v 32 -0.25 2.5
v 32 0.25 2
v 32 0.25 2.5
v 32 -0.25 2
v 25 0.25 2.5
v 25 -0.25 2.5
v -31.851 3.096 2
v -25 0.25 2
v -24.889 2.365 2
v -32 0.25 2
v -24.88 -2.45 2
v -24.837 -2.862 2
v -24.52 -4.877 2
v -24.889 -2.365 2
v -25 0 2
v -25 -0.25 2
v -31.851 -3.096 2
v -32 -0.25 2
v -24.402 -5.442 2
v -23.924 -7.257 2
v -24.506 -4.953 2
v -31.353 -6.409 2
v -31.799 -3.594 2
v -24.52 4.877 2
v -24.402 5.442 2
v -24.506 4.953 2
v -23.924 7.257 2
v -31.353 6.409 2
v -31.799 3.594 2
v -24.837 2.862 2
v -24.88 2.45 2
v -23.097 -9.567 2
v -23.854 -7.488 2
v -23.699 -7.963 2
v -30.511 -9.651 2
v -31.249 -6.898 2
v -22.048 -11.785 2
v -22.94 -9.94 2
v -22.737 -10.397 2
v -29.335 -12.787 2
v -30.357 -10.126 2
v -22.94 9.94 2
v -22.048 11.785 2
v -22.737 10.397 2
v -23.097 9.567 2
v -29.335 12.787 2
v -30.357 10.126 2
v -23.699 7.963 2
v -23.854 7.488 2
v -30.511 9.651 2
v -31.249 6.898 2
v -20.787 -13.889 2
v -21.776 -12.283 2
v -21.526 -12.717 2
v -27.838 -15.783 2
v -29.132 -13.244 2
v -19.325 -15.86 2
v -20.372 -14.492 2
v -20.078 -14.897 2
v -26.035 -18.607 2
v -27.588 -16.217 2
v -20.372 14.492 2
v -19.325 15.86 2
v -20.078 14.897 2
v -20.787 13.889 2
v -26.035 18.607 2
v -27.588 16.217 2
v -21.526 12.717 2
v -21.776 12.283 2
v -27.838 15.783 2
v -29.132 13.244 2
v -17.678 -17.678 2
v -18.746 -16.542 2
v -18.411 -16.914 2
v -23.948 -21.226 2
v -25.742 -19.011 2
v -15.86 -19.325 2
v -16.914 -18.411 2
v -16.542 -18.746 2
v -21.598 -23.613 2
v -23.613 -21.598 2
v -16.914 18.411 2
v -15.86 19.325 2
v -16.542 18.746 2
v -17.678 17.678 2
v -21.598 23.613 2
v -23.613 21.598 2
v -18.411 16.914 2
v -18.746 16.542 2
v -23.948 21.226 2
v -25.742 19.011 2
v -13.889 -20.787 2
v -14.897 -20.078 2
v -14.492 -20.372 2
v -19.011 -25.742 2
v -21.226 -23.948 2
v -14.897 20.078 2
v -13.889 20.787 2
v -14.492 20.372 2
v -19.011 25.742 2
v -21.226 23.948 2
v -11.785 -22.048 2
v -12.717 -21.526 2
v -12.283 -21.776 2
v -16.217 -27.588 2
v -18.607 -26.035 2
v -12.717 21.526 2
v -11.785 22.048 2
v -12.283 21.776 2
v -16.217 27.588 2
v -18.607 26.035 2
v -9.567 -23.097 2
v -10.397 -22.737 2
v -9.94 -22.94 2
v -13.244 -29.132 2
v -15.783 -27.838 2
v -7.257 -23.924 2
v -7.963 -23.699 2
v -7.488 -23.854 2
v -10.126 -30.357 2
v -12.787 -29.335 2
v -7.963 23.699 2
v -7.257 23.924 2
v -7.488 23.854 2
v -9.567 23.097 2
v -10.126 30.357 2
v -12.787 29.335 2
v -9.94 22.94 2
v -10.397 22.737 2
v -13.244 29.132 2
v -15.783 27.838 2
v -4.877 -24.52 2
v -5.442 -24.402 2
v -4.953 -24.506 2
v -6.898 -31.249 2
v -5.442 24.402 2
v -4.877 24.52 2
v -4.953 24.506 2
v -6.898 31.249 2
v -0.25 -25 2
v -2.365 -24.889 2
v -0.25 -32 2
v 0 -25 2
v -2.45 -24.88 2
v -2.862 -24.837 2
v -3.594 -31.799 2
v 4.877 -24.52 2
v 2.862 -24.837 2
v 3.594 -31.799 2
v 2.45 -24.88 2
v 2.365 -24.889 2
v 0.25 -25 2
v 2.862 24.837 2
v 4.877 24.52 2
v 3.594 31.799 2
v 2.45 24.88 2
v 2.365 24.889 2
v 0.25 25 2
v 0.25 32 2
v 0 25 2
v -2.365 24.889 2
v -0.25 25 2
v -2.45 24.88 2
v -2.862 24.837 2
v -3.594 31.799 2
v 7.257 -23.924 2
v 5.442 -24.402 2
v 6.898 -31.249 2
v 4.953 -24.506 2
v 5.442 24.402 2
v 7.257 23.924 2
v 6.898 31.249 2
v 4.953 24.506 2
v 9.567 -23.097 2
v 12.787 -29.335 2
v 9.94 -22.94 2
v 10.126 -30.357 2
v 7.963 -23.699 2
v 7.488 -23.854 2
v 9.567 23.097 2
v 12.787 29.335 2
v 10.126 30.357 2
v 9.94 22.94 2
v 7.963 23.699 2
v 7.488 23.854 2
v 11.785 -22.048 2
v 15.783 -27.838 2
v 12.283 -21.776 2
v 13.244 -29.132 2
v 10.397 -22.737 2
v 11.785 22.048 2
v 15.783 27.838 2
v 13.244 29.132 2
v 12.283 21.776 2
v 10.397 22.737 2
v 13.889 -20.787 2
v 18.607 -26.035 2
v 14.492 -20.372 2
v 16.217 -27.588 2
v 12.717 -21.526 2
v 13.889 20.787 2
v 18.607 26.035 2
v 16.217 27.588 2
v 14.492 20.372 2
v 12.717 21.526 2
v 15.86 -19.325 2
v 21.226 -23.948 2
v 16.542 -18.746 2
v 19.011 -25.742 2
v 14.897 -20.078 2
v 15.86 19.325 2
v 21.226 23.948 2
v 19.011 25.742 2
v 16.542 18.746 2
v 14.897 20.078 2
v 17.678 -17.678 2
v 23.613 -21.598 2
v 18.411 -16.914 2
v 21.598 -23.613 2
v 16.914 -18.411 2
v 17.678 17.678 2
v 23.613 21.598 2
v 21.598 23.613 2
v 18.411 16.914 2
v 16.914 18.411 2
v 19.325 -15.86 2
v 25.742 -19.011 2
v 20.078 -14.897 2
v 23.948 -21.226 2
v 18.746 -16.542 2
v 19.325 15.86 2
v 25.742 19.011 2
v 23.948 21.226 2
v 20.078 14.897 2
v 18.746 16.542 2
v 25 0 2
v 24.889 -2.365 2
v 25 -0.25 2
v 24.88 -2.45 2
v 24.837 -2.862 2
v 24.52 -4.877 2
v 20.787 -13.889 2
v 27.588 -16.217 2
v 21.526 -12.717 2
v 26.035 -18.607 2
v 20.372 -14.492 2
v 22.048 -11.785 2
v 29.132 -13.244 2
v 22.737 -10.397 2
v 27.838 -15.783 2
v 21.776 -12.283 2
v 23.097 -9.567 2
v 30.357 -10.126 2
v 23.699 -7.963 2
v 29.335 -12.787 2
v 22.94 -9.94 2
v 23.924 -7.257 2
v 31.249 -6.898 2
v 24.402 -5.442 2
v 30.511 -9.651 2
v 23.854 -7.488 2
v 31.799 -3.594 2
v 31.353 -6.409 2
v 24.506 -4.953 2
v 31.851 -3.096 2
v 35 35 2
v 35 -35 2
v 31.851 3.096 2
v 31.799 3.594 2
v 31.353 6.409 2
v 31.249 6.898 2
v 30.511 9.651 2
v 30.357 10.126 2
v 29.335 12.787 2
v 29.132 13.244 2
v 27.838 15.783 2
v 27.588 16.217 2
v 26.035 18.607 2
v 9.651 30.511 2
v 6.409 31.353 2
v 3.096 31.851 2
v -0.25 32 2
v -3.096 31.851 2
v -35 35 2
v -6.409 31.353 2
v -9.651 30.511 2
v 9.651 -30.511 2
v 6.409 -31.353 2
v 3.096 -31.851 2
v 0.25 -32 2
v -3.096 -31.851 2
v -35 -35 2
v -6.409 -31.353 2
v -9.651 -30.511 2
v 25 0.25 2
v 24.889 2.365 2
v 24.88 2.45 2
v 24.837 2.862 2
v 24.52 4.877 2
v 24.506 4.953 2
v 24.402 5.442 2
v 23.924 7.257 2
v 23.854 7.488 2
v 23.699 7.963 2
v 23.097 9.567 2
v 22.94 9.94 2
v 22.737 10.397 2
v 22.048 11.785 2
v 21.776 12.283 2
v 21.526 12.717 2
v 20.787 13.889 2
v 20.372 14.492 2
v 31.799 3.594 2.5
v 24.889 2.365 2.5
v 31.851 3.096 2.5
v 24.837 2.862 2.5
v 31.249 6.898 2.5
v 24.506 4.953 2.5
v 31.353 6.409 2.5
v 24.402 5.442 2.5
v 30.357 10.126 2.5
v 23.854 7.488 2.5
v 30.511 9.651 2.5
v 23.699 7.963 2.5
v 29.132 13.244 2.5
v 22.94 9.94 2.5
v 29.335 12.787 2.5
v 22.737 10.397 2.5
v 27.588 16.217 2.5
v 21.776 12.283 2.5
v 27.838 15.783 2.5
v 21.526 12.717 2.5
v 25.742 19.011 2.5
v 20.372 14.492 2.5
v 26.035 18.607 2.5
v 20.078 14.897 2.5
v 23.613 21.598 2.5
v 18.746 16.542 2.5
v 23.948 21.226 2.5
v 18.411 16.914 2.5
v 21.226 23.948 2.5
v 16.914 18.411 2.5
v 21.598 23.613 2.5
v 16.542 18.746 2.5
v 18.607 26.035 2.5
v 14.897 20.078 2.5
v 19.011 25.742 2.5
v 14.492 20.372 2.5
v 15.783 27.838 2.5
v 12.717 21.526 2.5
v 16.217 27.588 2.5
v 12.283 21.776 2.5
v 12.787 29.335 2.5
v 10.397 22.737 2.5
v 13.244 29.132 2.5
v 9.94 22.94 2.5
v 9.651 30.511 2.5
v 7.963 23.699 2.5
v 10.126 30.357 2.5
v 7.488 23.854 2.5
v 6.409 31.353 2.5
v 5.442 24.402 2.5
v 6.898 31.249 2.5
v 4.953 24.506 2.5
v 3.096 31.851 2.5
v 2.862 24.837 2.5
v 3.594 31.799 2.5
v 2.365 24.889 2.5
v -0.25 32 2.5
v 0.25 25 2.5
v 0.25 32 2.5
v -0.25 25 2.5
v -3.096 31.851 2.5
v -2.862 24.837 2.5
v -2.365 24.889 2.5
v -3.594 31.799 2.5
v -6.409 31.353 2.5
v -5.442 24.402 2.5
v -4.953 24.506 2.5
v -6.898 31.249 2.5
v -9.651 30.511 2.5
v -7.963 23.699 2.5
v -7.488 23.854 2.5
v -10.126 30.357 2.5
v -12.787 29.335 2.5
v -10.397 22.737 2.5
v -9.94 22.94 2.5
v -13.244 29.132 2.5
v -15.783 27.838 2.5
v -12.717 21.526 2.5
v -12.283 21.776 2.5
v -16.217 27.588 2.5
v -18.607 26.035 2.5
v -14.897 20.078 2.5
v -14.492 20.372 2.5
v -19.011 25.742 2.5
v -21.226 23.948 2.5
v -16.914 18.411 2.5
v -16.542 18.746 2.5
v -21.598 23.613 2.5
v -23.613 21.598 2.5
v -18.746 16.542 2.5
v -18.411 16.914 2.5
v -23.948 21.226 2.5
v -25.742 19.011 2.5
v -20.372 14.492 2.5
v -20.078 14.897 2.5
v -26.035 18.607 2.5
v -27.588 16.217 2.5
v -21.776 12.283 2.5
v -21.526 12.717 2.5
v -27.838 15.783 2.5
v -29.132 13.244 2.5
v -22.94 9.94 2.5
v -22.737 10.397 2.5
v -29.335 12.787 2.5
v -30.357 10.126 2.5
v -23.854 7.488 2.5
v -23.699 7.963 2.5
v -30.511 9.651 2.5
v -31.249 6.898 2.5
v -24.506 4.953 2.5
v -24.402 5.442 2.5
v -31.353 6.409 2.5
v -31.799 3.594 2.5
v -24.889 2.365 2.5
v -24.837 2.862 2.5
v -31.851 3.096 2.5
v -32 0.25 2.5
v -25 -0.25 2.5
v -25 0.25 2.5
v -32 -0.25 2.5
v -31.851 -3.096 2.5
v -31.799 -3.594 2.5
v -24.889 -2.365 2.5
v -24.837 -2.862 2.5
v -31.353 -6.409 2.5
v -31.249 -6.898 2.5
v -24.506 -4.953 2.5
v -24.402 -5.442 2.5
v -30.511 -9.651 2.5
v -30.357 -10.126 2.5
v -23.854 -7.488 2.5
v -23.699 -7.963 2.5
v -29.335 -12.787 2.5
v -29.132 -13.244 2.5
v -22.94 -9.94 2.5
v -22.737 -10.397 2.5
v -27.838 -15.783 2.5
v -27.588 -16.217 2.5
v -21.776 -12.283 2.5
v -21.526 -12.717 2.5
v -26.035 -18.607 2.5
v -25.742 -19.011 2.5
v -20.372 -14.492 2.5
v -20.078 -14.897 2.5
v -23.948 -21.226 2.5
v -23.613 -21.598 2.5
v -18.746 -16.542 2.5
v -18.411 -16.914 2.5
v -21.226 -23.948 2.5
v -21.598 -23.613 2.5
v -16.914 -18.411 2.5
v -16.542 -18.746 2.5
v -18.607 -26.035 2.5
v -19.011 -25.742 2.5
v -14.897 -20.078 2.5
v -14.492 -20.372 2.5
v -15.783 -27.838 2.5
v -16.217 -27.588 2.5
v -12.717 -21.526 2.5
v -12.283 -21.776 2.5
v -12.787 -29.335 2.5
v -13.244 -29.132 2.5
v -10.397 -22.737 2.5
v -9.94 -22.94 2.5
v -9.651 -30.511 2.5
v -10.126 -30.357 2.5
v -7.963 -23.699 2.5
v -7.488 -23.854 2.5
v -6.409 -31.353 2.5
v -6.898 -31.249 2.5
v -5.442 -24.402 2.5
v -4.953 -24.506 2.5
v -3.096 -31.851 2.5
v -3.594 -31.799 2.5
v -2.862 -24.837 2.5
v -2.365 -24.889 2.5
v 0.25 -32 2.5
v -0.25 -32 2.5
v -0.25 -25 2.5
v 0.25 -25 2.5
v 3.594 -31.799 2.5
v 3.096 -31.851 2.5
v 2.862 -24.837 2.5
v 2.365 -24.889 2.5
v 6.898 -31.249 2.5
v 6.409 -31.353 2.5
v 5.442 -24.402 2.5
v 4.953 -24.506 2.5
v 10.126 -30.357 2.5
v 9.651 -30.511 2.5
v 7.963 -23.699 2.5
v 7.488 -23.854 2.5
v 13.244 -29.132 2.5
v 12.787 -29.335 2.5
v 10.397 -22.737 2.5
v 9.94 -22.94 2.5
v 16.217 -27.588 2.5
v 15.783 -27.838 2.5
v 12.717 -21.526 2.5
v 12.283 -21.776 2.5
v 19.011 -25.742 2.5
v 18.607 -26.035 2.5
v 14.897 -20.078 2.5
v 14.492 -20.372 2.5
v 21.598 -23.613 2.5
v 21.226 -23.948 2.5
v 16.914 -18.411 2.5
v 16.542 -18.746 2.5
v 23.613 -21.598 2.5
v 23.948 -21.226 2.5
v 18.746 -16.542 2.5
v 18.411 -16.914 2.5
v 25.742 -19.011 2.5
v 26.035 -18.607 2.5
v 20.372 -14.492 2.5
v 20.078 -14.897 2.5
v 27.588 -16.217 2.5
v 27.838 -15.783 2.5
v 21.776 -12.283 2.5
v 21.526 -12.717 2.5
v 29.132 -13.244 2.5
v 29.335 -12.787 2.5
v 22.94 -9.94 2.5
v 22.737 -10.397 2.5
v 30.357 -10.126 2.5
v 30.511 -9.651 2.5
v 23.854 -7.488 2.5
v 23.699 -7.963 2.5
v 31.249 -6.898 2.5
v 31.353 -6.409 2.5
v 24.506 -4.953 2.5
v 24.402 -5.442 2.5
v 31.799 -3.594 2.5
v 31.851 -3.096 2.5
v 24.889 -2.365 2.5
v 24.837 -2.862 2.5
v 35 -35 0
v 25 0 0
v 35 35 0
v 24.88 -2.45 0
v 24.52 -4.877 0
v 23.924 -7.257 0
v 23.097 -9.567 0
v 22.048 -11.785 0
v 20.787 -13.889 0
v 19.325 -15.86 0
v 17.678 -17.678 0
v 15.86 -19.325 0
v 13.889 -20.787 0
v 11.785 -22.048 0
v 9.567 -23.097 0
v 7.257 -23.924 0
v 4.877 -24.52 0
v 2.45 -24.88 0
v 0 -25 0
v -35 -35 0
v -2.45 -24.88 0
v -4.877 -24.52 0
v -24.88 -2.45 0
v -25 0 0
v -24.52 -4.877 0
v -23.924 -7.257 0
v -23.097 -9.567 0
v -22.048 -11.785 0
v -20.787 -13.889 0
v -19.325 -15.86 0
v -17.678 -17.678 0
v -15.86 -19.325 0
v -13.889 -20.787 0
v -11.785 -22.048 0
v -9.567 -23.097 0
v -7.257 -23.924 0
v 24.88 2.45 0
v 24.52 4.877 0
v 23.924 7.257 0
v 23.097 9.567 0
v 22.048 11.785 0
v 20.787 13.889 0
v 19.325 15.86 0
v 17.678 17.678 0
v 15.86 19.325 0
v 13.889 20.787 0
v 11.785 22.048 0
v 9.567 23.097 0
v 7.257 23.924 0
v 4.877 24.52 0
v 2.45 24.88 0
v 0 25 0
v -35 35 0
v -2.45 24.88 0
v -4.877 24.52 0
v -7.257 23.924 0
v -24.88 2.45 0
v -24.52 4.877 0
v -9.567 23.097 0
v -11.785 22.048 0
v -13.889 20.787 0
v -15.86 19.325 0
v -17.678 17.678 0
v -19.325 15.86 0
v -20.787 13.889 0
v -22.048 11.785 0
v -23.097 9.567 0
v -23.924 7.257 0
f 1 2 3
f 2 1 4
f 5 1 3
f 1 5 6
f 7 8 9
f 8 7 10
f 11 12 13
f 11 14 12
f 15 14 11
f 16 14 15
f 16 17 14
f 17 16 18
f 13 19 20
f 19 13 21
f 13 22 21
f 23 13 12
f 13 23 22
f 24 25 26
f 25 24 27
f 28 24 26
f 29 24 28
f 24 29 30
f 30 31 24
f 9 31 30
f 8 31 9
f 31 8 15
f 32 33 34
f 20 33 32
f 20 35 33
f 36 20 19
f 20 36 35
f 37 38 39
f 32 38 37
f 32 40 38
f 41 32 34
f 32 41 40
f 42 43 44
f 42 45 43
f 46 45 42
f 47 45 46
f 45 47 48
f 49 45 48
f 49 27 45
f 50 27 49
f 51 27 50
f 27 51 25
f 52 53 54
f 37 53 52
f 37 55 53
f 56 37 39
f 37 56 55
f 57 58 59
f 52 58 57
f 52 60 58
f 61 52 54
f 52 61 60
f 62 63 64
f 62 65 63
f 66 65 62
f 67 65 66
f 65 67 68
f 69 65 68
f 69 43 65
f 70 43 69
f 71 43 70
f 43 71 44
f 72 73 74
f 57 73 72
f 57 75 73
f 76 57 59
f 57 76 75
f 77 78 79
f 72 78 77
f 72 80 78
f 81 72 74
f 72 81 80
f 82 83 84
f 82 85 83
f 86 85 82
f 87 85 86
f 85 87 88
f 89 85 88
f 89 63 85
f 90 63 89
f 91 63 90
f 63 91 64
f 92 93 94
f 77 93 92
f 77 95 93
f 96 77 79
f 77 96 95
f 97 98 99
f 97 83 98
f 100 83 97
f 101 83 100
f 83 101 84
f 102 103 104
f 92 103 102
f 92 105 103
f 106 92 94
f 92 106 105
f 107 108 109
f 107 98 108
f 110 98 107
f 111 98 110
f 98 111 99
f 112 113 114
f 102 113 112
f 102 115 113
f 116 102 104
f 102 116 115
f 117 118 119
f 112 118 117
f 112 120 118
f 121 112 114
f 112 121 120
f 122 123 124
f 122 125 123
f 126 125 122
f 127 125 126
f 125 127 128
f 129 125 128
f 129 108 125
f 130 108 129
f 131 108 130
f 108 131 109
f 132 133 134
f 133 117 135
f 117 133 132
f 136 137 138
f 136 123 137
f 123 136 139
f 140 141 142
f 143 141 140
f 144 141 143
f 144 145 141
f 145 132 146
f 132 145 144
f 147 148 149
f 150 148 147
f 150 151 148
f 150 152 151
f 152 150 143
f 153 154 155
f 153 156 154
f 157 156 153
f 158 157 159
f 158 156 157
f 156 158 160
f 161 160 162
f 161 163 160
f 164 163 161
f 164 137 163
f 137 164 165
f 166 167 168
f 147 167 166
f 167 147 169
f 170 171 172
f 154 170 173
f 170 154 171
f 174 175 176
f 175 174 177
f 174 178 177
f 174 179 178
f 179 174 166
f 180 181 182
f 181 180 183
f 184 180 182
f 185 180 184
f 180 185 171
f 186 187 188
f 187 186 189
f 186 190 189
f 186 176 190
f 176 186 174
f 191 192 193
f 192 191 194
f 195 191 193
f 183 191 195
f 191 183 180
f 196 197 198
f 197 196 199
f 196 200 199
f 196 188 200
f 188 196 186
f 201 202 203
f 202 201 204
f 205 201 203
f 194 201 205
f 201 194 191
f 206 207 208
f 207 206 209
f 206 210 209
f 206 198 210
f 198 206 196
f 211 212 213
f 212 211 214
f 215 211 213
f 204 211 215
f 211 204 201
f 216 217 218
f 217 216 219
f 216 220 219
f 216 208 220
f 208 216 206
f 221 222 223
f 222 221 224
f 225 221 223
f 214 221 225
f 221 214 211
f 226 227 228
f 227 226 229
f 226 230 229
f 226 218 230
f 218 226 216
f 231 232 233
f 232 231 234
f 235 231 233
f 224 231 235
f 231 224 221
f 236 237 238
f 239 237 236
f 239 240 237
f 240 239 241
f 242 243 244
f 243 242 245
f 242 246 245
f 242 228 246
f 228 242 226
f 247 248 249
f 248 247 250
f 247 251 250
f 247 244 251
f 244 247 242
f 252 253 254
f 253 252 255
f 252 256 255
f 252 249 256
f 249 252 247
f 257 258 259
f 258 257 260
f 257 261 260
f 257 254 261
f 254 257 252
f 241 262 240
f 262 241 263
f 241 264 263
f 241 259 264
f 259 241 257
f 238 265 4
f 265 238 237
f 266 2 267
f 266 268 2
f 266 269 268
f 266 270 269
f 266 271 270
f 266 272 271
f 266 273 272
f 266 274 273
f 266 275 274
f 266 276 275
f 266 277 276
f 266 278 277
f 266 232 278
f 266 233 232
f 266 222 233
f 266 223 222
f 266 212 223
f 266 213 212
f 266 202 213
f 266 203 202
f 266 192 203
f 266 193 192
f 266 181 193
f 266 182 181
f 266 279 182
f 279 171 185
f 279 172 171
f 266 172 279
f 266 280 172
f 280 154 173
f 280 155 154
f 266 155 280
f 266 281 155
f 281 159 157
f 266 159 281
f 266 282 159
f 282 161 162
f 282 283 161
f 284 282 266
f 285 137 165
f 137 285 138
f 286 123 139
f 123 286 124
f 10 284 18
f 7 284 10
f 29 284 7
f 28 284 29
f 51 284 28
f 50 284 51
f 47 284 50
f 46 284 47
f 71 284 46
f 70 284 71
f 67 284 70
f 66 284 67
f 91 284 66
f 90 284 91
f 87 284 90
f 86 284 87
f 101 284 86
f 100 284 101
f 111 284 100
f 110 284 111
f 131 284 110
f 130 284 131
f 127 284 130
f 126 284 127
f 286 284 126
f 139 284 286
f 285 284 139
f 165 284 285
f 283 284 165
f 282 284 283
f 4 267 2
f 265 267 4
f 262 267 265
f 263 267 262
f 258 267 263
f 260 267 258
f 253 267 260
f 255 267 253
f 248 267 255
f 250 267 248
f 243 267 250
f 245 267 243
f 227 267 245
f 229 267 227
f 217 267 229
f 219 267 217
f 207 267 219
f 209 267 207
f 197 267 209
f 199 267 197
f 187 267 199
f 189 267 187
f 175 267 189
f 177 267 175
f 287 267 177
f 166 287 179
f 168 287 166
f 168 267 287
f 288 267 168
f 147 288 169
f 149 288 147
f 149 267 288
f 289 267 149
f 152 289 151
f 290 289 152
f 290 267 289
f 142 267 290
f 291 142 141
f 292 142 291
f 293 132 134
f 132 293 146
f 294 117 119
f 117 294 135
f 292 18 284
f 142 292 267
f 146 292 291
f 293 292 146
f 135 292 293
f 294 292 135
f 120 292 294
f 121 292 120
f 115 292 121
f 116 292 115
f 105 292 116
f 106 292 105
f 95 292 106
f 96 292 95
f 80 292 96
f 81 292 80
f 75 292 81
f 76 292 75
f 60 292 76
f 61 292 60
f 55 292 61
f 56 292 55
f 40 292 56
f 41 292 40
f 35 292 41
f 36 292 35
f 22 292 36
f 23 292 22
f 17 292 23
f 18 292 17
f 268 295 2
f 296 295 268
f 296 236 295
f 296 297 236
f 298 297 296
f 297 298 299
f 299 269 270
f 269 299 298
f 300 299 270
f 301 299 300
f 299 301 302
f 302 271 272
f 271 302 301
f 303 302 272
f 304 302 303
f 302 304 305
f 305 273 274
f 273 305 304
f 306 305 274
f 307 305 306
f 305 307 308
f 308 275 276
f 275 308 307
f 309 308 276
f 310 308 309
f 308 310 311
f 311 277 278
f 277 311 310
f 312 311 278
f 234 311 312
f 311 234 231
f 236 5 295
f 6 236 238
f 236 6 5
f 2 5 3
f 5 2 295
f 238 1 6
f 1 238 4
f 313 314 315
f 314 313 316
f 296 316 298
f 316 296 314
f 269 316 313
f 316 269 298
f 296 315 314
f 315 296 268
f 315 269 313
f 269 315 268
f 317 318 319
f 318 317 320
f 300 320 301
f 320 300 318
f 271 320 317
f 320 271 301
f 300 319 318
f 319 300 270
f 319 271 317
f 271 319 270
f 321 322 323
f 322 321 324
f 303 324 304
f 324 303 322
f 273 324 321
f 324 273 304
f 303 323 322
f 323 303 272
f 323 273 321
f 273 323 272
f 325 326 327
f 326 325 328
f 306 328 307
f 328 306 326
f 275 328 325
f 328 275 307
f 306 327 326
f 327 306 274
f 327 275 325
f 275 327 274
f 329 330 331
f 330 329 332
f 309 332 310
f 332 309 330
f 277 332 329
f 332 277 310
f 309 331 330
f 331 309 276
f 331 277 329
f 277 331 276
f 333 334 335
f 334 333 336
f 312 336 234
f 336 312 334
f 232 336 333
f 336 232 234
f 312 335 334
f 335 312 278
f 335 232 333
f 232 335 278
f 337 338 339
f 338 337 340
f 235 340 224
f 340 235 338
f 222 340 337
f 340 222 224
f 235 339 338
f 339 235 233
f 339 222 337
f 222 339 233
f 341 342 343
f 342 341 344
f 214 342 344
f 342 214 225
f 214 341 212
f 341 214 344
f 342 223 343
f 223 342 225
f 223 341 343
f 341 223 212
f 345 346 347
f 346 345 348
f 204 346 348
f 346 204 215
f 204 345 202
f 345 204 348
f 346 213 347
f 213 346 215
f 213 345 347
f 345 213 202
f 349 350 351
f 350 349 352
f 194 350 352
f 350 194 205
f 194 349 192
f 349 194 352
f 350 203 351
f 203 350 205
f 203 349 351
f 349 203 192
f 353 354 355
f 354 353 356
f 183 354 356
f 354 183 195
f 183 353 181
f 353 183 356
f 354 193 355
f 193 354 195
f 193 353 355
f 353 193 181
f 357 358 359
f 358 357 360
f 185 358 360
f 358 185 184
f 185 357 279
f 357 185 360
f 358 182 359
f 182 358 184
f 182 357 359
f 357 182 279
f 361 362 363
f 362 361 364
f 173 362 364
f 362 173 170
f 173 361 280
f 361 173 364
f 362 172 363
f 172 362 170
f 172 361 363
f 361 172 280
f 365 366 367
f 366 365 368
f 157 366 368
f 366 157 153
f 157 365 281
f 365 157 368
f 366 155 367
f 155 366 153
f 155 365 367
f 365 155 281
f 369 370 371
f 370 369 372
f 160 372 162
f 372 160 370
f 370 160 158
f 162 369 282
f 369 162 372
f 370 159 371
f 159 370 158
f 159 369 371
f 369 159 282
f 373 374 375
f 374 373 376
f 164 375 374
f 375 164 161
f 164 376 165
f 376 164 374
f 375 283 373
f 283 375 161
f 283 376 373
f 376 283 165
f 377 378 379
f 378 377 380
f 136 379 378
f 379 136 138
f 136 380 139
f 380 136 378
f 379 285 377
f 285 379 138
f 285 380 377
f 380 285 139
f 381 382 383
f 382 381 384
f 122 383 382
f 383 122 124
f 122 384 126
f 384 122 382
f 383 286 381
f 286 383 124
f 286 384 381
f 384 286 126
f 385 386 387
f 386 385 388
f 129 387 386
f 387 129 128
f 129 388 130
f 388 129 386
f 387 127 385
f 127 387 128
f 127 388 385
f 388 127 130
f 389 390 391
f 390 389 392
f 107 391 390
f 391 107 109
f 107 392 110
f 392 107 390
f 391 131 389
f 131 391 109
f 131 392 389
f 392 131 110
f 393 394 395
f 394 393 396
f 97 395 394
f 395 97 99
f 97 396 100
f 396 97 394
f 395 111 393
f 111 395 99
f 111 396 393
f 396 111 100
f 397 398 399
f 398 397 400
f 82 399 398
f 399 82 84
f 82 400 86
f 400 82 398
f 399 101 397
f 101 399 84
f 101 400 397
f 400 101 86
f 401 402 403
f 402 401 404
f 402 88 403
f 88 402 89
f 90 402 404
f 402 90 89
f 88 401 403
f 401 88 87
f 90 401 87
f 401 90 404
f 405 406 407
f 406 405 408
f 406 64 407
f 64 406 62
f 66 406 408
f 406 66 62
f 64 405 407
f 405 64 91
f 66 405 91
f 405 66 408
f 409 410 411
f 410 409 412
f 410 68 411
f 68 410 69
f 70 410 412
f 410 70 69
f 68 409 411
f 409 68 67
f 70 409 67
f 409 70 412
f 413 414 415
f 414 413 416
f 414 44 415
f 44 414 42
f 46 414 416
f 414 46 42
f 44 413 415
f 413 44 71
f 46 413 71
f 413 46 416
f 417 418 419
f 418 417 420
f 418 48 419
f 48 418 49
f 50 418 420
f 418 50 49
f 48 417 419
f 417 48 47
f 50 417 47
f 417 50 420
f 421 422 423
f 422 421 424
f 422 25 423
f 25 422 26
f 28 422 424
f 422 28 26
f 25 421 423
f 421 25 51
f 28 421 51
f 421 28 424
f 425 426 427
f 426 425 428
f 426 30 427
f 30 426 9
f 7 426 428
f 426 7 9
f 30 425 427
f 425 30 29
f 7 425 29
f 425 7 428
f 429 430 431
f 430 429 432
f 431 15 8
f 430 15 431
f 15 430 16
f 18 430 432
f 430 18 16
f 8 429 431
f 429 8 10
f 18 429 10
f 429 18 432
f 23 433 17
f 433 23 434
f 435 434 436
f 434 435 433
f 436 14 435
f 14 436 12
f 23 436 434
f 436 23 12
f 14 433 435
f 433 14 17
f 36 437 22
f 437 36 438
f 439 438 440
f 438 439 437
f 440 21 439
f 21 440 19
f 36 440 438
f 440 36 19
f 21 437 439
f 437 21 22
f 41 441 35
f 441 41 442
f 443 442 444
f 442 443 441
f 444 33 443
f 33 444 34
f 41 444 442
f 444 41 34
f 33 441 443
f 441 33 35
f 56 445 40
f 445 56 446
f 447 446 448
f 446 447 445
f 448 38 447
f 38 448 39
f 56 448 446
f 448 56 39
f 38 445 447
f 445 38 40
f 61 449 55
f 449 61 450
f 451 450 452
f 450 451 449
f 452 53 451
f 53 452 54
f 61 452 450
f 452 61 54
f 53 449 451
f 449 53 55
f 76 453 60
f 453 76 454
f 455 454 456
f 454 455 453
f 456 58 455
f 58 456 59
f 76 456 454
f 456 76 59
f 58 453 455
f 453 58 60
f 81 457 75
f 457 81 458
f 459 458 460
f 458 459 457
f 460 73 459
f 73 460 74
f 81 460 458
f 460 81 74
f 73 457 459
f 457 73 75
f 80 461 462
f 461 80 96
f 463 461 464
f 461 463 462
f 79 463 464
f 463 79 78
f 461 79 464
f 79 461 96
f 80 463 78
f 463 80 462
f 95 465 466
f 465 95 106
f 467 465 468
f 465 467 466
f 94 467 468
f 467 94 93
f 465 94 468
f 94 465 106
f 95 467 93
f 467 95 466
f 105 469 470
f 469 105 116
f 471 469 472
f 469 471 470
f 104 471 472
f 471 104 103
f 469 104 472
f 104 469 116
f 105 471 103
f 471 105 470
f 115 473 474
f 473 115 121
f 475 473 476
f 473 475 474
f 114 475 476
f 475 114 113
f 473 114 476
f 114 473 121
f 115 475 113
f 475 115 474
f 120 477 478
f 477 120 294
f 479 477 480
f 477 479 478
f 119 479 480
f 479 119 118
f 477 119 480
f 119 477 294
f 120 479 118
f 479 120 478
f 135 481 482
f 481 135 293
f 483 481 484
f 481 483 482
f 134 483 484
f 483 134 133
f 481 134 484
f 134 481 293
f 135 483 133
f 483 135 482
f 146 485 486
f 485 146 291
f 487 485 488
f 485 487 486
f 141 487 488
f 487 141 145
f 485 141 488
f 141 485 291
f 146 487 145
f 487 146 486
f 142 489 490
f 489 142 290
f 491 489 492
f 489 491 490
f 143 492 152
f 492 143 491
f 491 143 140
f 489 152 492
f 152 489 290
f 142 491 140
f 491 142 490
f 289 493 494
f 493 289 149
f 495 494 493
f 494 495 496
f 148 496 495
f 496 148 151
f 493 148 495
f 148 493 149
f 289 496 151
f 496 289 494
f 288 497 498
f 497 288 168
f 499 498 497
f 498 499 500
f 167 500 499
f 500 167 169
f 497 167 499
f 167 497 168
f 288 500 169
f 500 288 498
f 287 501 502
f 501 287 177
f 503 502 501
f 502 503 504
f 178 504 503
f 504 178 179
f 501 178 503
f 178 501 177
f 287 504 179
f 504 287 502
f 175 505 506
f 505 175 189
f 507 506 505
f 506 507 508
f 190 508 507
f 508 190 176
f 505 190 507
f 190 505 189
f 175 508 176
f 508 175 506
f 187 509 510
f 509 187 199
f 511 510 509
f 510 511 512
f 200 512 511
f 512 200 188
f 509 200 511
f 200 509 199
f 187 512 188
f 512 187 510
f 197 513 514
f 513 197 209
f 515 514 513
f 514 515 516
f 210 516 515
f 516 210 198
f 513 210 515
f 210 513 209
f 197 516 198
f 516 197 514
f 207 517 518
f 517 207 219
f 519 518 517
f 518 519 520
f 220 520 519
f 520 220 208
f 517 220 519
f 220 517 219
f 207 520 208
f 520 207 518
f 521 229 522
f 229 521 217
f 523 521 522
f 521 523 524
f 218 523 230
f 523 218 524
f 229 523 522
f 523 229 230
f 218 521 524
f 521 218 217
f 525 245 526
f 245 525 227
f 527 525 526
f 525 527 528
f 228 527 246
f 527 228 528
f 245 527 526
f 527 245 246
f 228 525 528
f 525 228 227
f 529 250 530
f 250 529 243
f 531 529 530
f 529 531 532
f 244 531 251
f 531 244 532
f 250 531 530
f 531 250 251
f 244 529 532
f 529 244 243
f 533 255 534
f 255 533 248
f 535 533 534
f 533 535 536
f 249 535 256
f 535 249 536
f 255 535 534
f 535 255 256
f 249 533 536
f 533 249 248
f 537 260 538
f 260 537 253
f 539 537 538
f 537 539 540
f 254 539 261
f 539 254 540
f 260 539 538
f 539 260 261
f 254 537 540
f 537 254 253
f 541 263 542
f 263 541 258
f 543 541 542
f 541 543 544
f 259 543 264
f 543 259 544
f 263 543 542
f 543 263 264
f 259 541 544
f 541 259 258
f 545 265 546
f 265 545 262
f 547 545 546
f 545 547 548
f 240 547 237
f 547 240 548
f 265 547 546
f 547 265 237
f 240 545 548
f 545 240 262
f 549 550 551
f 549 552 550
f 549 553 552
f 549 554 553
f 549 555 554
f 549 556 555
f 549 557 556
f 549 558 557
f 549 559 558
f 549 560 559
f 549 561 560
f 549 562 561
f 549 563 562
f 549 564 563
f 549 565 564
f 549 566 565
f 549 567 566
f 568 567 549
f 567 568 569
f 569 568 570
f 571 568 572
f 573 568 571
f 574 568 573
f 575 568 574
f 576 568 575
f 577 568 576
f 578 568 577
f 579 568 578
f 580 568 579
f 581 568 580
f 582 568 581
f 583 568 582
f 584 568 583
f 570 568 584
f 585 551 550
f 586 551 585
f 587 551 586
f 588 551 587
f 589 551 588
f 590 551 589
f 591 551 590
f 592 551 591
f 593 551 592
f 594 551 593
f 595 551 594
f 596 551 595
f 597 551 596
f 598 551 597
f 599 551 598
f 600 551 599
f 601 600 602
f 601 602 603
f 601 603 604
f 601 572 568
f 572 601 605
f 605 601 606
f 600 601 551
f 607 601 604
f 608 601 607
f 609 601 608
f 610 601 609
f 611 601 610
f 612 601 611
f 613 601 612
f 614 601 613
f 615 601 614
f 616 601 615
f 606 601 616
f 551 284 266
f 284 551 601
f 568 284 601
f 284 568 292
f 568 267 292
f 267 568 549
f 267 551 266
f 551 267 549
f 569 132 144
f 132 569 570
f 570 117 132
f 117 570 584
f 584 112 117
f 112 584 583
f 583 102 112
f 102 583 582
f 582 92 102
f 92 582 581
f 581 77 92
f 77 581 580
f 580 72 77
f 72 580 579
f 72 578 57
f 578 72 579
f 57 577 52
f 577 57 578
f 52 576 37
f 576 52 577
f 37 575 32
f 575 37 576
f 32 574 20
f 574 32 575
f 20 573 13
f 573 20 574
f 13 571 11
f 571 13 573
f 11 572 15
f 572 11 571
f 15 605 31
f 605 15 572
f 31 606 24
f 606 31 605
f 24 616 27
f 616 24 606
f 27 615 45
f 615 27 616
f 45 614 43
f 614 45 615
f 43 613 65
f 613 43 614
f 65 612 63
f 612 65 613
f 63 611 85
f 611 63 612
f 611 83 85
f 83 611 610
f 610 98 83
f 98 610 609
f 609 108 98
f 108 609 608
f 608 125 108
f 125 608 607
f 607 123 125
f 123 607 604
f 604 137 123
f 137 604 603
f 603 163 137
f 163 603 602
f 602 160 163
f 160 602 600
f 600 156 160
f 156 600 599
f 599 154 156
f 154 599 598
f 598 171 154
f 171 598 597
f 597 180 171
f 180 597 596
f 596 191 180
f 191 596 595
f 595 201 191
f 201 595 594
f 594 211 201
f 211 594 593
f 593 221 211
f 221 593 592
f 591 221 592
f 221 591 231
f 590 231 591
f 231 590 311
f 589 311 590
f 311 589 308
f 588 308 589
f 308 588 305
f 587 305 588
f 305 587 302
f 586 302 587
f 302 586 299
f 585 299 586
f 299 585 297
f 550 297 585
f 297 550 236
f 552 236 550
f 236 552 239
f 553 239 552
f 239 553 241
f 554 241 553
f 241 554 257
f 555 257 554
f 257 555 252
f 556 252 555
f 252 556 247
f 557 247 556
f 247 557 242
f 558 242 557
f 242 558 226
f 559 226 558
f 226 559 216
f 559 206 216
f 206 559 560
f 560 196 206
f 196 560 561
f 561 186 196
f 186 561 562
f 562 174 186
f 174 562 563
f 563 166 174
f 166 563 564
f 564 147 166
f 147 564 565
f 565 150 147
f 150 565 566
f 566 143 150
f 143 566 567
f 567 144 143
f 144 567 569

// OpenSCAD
$fn = $preview ? 16 : 64;

x=70;
y=70;
d=50;
z=2;
riller=60;
rillelengde=7;
rillebredde=.5;
rillehoyde=.5;

bruk_riller=1;
bruk_negative_riller=0;

module adapter() {
    linear_extrude(z) {
        difference() {
            translate([-x/2,-y/2]) {
                square([x,y]);
            }
            circle(d=d);
        }
    }
}

module riller() {
    for (i=[0:1:riller-1]) {
        rotate([0,0,i*(360/riller)]) {
            translate([d/2,-rillebredde/2,z]) {
                cube([rillelengde,rillebredde,rillehoyde]);
            }
        }
    }
}

module negative_riller() {
    for (i=[0:1:riller-1]) {
        rotate([0,0,i*(360/riller)]) {
            translate([d/2,-rillebredde/2,0]) {
                cube([rillelengde,rillebredde,rillehoyde]);
            }
        }
    }
}

if (bruk_riller) {
    riller();
}
difference() {
    adapter();
    if (bruk_negative_riller) {
        negative_riller();
    }
}
